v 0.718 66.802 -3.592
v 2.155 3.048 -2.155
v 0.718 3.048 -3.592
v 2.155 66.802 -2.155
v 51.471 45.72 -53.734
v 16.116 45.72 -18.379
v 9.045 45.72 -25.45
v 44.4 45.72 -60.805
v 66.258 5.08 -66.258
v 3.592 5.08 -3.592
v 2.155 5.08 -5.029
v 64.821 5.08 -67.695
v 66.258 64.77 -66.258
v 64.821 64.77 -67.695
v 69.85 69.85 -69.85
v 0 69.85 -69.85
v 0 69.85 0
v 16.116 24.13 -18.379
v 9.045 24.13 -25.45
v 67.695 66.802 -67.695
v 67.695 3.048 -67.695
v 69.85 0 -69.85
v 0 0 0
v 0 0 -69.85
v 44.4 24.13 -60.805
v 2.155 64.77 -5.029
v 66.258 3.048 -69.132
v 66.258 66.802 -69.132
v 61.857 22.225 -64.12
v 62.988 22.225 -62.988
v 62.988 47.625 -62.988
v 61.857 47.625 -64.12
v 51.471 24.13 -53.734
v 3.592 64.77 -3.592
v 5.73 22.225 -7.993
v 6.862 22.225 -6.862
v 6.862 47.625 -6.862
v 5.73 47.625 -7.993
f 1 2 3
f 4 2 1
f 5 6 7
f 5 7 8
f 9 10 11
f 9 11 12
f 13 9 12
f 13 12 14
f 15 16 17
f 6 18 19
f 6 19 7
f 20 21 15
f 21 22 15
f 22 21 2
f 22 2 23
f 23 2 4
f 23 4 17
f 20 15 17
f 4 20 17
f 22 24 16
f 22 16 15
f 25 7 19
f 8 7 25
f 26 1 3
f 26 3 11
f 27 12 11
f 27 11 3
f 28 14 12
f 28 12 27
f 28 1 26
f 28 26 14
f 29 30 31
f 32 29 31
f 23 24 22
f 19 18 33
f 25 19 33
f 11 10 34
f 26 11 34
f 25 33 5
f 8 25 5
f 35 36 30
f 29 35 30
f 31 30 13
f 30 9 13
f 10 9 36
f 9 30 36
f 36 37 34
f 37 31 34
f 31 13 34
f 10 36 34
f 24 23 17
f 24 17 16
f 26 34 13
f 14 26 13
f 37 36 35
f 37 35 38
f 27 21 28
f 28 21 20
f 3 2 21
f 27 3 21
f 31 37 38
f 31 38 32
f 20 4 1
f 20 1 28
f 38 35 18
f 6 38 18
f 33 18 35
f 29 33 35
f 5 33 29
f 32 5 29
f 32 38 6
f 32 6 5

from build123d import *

# Parameters (mm, degrees)
SKETCH1_W           = 69.85
SKETCH1_H           = 69.85
BOSS_EXTRUDE1_DEPTH = 69.85
CUT_EXTRUDE2_DEPTH  = 100
SKETCH3_W           = 92.686817332
SKETCH3_H           = 63.754
SKETCH3_W_2         = 88.622817332
SKETCH3_H_2         = 59.69
CUT_EXTRUDE4_DEPTH  = 2.032
SKETCH4_W           = 79.375
SKETCH4_H           = 25.4
CUT_EXTRUDE5_DEPTH  = 1.6
SKETCH5_W           = 50
SKETCH5_H           = 21.59
CUT_EXTRUDE6_DEPTH  = 10


with BuildPart() as part:
    # Sketch1 → Boss-Extrude1 (new body)
    with BuildSketch(Plane(origin=(0, 0, 0), x_dir=(1, 0, 0), z_dir=(0, 1, 0))):
        with Locations((34.925, 34.925)):
            Rectangle(SKETCH1_W, SKETCH1_H)
    extrude(amount=BOSS_EXTRUDE1_DEPTH)

    # Sketch2 → Cut-Extrude2 (cut)
    with BuildSketch(Plane(origin=(0, 0, 0), x_dir=(0.707106781, 0, -0.707106781), z_dir=(0.707106781, 0, 0.707106781))):
        Polygon((98.782817332, 69.85), (98.782817332, 0), (49.391408666, 0), (0, 0), (0, 69.85), (49.391408666, 69.85), align=None)
    extrude(amount=CUT_EXTRUDE2_DEPTH, mode=Mode.SUBTRACT)

    # Sketch3 → Cut-Extrude4 (cut)
    with BuildSketch(Plane(origin=(0, 0, 0), x_dir=(0.707106781, 0, -0.707106781), z_dir=(0.707106781, 0, 0.707106781))):
        with Locations((49.391408666, 34.925)):
            Rectangle(SKETCH3_W, SKETCH3_H)
        with Locations((49.391408666, 34.925)):
            Rectangle(SKETCH3_W_2, SKETCH3_H_2, mode=Mode.SUBTRACT)
    extrude(amount=-CUT_EXTRUDE4_DEPTH, mode=Mode.SUBTRACT)

    # Sketch4 → Cut-Extrude5 (cut)
    with BuildSketch(Plane(origin=(0, 0, 0), x_dir=(0.707106781, 0, -0.707106781), z_dir=(0.707106781, 0, 0.707106781))):
        with Locations((49.391408666, 34.925)):
            Rectangle(SKETCH4_W, SKETCH4_H)
    extrude(amount=-CUT_EXTRUDE5_DEPTH, mode=Mode.SUBTRACT)

    # Sketch5 → Cut-Extrude6 (cut)
    with BuildSketch(Plane(origin=(-1.13137085, 0, -1.13137085), x_dir=(0.707106781, 0, -0.707106781), z_dir=(0.707106781, 0, 0.707106781))):
        with Locations((49.391408666, 34.925)):
            Rectangle(SKETCH5_W, SKETCH5_H)
    extrude(amount=-CUT_EXTRUDE6_DEPTH, mode=Mode.SUBTRACT)


solid = part.part
